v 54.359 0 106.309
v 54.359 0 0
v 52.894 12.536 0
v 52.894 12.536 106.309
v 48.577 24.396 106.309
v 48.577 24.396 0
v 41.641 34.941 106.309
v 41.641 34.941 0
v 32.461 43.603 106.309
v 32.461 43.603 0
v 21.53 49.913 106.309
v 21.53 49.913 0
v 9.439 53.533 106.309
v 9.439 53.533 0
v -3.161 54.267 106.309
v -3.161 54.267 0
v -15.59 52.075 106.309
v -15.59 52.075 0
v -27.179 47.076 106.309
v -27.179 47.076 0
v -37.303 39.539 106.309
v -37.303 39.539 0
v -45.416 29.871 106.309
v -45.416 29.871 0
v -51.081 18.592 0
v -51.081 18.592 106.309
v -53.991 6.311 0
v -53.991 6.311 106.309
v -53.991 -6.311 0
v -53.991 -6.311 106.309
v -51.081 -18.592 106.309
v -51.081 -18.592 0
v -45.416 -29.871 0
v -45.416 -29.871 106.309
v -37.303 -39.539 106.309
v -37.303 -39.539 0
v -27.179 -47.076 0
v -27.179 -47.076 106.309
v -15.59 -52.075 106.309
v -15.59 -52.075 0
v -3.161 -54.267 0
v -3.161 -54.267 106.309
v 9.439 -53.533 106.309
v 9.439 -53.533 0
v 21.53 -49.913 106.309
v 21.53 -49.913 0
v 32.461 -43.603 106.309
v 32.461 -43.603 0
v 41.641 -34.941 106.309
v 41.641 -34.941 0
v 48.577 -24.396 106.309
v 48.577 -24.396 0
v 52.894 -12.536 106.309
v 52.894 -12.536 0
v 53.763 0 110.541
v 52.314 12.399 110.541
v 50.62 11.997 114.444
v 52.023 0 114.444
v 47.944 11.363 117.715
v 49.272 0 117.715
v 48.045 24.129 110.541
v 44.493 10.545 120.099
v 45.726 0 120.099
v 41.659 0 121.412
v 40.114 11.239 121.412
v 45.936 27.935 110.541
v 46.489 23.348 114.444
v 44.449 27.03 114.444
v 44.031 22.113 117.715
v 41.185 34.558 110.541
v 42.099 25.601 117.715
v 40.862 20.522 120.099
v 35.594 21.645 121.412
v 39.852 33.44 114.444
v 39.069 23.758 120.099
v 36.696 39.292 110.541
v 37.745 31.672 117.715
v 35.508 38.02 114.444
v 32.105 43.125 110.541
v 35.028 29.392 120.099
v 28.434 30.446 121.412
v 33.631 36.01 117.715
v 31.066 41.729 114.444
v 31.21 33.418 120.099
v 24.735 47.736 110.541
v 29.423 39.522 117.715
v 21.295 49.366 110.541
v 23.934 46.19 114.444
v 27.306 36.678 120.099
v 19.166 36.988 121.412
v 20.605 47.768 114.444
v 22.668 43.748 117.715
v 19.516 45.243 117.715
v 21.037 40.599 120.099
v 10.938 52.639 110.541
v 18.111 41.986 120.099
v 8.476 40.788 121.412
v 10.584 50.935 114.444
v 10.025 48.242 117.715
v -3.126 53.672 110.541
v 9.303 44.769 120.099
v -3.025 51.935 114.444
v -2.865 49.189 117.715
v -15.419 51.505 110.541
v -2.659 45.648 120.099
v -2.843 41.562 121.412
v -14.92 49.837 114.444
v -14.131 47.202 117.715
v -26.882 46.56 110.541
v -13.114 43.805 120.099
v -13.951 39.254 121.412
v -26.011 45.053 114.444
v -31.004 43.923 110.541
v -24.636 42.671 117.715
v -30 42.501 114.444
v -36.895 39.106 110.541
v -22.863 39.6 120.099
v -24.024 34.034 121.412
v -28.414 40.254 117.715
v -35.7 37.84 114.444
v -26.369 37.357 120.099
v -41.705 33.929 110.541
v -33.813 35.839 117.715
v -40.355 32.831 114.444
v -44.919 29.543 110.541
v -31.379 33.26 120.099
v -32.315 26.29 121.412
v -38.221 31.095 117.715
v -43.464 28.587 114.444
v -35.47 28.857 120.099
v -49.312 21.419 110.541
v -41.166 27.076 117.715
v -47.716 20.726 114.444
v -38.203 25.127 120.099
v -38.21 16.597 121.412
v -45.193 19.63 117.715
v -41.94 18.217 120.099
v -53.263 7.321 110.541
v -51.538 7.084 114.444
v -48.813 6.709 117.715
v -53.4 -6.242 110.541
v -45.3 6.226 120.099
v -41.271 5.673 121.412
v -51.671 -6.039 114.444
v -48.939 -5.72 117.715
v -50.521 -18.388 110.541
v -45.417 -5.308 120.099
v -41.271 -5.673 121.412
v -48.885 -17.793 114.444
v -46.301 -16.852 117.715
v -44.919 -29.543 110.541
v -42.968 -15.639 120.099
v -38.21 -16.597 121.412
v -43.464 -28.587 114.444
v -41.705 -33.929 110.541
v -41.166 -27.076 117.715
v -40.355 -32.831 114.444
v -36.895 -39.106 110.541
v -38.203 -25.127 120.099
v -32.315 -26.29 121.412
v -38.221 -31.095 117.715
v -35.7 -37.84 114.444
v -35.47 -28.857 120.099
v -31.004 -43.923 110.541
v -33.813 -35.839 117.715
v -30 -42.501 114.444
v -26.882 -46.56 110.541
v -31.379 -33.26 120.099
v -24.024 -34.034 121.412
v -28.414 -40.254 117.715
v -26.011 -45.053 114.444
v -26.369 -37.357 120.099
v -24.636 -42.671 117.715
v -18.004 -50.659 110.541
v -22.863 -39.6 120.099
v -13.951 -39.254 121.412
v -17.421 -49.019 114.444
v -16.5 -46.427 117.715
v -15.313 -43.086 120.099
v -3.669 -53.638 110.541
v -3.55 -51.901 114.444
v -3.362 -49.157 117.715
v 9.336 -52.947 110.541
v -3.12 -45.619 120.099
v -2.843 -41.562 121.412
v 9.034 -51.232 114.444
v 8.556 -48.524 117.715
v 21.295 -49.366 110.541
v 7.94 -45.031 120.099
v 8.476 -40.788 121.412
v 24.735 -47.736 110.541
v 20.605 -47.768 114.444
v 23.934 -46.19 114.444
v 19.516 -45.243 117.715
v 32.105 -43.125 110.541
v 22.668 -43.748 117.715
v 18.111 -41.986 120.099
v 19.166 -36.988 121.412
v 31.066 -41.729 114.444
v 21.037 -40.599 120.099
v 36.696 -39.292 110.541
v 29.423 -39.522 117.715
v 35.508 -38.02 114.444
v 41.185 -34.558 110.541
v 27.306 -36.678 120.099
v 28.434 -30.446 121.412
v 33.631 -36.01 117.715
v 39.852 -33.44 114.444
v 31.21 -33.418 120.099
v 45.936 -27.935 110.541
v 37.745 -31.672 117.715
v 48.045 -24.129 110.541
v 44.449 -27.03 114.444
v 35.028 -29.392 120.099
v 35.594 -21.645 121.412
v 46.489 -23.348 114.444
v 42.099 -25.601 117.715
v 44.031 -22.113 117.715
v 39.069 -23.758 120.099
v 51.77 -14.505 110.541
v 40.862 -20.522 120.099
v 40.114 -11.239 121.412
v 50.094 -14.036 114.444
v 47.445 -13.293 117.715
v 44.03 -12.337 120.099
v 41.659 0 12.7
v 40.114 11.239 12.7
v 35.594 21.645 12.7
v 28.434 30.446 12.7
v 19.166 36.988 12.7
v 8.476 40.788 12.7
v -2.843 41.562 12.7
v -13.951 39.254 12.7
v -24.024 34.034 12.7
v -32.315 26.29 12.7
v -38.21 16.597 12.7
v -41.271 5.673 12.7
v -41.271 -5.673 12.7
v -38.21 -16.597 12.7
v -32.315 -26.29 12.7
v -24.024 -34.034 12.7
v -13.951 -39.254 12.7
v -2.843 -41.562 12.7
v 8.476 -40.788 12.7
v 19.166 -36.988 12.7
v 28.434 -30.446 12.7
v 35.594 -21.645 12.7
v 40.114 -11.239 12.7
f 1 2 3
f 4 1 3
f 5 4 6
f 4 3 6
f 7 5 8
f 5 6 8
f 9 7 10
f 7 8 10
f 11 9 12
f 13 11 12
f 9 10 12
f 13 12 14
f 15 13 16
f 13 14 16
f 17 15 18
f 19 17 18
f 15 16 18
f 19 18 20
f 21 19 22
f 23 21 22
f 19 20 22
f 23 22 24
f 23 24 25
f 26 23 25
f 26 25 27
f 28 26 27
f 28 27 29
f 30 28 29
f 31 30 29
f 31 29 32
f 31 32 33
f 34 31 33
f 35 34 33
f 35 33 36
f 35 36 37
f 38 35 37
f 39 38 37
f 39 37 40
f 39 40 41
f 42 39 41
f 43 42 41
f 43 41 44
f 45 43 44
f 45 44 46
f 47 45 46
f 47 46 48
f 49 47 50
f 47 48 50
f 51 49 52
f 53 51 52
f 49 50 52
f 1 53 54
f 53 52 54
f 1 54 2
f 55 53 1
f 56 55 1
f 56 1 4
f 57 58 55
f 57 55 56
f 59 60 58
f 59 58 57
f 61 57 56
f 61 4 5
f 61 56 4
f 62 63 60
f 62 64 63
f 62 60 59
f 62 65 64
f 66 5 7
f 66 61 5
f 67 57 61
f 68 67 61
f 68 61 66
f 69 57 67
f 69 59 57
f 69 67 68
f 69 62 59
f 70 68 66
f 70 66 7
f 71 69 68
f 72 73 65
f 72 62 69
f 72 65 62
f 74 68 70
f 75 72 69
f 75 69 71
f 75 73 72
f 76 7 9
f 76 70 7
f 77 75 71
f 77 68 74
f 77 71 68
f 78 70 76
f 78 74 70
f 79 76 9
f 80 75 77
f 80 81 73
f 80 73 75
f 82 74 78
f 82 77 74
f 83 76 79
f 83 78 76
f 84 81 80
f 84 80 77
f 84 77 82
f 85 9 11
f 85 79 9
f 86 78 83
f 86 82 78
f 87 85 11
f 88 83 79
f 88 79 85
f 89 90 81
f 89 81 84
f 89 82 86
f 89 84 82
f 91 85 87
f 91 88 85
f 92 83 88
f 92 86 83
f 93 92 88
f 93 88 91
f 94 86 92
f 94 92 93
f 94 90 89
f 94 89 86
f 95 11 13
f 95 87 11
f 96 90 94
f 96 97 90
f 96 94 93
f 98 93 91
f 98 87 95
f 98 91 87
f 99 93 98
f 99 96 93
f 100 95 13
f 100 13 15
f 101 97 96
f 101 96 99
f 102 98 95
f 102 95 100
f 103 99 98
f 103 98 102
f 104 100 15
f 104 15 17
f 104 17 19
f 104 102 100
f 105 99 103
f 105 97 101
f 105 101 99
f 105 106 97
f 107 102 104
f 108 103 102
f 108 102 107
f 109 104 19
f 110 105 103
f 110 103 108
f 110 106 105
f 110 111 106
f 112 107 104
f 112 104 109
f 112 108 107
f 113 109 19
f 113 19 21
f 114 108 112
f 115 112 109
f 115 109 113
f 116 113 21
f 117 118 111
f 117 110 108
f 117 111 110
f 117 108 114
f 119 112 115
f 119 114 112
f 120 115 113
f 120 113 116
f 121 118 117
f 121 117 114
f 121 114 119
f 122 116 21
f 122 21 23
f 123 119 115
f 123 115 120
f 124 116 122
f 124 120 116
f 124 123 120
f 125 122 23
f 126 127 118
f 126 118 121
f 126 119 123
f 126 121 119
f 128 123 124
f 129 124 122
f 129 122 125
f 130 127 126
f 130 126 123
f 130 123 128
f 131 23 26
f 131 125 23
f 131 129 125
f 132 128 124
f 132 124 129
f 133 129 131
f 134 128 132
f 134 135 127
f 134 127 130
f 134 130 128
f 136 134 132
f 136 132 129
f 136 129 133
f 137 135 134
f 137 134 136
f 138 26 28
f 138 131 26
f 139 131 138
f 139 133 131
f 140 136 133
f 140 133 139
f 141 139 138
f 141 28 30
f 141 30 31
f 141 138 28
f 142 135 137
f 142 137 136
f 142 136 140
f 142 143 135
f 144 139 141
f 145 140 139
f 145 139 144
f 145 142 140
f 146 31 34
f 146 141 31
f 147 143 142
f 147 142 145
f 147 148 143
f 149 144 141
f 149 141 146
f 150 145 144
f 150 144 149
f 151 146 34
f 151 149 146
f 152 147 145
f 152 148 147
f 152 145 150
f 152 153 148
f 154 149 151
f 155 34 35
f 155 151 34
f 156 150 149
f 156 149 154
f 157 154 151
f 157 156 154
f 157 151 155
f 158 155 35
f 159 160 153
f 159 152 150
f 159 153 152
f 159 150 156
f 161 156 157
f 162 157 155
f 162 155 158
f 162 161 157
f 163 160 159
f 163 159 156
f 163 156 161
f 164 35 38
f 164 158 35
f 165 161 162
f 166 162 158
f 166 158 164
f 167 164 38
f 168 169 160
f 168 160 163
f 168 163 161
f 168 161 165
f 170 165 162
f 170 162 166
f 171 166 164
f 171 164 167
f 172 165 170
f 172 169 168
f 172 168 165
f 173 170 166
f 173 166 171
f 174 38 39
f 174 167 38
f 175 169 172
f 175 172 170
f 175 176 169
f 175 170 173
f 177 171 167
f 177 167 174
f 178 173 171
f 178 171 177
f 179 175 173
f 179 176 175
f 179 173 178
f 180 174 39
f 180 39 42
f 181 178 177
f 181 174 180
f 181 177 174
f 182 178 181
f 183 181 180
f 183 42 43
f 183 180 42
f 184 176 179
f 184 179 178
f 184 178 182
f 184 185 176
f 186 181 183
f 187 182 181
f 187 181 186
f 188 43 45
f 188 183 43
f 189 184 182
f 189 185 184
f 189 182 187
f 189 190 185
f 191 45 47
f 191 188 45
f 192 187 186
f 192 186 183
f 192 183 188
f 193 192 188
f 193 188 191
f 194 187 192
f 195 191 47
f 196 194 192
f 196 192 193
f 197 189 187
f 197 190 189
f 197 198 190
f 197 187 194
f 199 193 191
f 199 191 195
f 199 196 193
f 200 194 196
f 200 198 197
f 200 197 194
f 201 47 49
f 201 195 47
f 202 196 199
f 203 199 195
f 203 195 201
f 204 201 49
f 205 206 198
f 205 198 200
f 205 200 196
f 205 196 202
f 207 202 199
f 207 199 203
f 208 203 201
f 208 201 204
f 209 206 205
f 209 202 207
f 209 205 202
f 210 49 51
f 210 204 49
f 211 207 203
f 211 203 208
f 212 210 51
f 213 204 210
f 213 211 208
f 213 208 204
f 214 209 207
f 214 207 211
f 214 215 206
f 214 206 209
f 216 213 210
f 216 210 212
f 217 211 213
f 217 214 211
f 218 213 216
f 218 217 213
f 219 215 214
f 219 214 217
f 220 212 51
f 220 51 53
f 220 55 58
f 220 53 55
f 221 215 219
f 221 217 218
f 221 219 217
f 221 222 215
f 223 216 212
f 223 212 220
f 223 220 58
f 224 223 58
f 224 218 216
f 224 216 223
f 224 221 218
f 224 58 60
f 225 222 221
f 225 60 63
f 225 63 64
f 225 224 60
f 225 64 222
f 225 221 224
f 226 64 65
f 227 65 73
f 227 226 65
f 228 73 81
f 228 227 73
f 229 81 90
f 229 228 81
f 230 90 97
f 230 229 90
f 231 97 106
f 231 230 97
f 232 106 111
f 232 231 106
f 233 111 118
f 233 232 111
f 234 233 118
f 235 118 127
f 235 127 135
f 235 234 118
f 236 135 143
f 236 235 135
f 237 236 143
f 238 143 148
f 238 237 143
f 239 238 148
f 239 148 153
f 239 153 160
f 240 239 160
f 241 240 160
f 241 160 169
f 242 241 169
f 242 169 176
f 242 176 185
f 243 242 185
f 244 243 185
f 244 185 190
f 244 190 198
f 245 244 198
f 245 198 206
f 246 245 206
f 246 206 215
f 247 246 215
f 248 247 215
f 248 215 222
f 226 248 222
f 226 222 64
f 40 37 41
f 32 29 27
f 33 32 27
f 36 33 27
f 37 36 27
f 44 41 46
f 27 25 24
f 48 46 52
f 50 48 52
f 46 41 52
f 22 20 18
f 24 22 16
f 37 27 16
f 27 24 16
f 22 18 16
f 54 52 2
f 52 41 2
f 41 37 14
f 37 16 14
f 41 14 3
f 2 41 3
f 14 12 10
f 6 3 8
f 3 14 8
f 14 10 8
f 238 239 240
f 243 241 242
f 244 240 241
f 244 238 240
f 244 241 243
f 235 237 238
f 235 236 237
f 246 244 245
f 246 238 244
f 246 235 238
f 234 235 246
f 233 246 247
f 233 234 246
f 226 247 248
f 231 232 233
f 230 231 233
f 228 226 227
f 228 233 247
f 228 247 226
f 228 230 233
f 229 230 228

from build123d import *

# Parameters (mm, degrees)
F0_R     = 54.3589736978
F1_DEPTH = 121.412
F2_T     = -12.7


# Not quite as in the source:
# - a fillet or chamfer that OpenCascade refuses, or shapes differently, is made with other operations: its cross-section is extruded or revolved along the edge and cut away or added


with BuildPart() as f1:
    # F0 (on Top) → F1 (new body)
    with BuildSketch(Plane.XY):
        Circle(F0_R)
    extrude(amount=F1_DEPTH)

    # F2
    f2_openings = [f1.faces().sort_by_distance(p)[0] for p in [
        (0, 0, 121.412),
    ]]
    offset(amount=F2_T, openings=f2_openings)

    # F3: fillet of radius 15.3302561211 on 1 edges, made by hand

    # F3_s1 → F3_t2 (revolve, cut)
    with BuildSketch(Plane.XZ):
        with BuildLine():
            ThreePointArc((54.3589736978, 106.3090696395), (50.7619876396, 116.1755343746), (41.6589736978, 121.412))
            Line((41.6589736978, 121.412), (54.3589736978, 121.412))
            Line((54.3589736978, 121.412), (54.3589736978, 106.3090696395))
        make_face()
    revolve(axis=Axis((0, 0, 121.412), (0, 0, 1)), mode=Mode.SUBTRACT)


solid = f1.part
